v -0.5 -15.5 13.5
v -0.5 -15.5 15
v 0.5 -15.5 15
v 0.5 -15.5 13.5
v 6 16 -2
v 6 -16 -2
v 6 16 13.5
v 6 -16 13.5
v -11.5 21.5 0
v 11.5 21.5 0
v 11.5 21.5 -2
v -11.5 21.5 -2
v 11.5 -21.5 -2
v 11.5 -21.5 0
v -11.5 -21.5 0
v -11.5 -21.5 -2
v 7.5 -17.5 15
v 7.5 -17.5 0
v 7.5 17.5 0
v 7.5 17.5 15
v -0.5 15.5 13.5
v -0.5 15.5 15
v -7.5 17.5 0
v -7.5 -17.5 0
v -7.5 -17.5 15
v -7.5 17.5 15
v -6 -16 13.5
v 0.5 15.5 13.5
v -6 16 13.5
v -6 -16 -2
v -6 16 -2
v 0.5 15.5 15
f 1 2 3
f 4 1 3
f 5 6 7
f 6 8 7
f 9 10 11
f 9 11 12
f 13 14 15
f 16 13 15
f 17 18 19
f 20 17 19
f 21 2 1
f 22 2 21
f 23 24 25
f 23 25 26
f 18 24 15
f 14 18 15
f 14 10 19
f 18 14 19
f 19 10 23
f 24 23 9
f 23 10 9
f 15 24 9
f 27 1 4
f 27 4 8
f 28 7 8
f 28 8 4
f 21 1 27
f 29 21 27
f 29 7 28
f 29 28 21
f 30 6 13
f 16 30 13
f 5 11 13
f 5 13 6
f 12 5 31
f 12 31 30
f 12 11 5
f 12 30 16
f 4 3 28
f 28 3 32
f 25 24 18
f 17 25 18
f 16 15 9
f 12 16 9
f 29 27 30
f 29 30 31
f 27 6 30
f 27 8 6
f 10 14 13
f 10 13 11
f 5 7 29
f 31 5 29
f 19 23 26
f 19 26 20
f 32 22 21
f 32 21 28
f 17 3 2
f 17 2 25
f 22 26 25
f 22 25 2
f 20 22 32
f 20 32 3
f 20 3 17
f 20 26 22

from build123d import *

# Parameters (mm, degrees)
SKETCH1_W           = 15
SKETCH1_H           = 35
BOSS_EXTRUDE1_DEPTH = 15
SKETCH3_W           = 12
SKETCH3_H           = 32
CUT_EXTRUDE2_DEPTH  = 13.5
SKETCH4_W           = 23
SKETCH4_H           = 43
SKETCH4_W_2         = 12
SKETCH4_H_2         = 32
BOSS_EXTRUDE2_DEPTH = 2
SKETCH5_W           = 1
SKETCH5_H           = 31
CUT_EXTRUDE3_DEPTH  = 2


with BuildPart() as part:
    # Sketch1 → Boss-Extrude1 (new body)
    with BuildSketch(Plane.XY):
        Rectangle(SKETCH1_W, SKETCH1_H)
    extrude(amount=BOSS_EXTRUDE1_DEPTH)

    # Sketch3 → Cut-Extrude2 (cut)
    with BuildSketch(Plane(origin=(0, 0, 0), x_dir=(-1, 0, 0), z_dir=(0, 0, -1))):
        Rectangle(SKETCH3_W, SKETCH3_H)
    extrude(amount=-CUT_EXTRUDE2_DEPTH, mode=Mode.SUBTRACT)

    # Sketch4 → Boss-Extrude2 (add)
    with BuildSketch(Plane(origin=(0, 0, 0), x_dir=(-1, 0, 0), z_dir=(0, 0, -1))):
        Rectangle(SKETCH4_W, SKETCH4_H)
        Rectangle(SKETCH4_W_2, SKETCH4_H_2, mode=Mode.SUBTRACT)
    extrude(amount=BOSS_EXTRUDE2_DEPTH)

    # Sketch5 → Cut-Extrude3 (cut)
    with BuildSketch(Plane.XY.offset(15)):
        Rectangle(SKETCH5_W, SKETCH5_H)
    extrude(amount=-CUT_EXTRUDE3_DEPTH, mode=Mode.SUBTRACT)


solid = part.part
